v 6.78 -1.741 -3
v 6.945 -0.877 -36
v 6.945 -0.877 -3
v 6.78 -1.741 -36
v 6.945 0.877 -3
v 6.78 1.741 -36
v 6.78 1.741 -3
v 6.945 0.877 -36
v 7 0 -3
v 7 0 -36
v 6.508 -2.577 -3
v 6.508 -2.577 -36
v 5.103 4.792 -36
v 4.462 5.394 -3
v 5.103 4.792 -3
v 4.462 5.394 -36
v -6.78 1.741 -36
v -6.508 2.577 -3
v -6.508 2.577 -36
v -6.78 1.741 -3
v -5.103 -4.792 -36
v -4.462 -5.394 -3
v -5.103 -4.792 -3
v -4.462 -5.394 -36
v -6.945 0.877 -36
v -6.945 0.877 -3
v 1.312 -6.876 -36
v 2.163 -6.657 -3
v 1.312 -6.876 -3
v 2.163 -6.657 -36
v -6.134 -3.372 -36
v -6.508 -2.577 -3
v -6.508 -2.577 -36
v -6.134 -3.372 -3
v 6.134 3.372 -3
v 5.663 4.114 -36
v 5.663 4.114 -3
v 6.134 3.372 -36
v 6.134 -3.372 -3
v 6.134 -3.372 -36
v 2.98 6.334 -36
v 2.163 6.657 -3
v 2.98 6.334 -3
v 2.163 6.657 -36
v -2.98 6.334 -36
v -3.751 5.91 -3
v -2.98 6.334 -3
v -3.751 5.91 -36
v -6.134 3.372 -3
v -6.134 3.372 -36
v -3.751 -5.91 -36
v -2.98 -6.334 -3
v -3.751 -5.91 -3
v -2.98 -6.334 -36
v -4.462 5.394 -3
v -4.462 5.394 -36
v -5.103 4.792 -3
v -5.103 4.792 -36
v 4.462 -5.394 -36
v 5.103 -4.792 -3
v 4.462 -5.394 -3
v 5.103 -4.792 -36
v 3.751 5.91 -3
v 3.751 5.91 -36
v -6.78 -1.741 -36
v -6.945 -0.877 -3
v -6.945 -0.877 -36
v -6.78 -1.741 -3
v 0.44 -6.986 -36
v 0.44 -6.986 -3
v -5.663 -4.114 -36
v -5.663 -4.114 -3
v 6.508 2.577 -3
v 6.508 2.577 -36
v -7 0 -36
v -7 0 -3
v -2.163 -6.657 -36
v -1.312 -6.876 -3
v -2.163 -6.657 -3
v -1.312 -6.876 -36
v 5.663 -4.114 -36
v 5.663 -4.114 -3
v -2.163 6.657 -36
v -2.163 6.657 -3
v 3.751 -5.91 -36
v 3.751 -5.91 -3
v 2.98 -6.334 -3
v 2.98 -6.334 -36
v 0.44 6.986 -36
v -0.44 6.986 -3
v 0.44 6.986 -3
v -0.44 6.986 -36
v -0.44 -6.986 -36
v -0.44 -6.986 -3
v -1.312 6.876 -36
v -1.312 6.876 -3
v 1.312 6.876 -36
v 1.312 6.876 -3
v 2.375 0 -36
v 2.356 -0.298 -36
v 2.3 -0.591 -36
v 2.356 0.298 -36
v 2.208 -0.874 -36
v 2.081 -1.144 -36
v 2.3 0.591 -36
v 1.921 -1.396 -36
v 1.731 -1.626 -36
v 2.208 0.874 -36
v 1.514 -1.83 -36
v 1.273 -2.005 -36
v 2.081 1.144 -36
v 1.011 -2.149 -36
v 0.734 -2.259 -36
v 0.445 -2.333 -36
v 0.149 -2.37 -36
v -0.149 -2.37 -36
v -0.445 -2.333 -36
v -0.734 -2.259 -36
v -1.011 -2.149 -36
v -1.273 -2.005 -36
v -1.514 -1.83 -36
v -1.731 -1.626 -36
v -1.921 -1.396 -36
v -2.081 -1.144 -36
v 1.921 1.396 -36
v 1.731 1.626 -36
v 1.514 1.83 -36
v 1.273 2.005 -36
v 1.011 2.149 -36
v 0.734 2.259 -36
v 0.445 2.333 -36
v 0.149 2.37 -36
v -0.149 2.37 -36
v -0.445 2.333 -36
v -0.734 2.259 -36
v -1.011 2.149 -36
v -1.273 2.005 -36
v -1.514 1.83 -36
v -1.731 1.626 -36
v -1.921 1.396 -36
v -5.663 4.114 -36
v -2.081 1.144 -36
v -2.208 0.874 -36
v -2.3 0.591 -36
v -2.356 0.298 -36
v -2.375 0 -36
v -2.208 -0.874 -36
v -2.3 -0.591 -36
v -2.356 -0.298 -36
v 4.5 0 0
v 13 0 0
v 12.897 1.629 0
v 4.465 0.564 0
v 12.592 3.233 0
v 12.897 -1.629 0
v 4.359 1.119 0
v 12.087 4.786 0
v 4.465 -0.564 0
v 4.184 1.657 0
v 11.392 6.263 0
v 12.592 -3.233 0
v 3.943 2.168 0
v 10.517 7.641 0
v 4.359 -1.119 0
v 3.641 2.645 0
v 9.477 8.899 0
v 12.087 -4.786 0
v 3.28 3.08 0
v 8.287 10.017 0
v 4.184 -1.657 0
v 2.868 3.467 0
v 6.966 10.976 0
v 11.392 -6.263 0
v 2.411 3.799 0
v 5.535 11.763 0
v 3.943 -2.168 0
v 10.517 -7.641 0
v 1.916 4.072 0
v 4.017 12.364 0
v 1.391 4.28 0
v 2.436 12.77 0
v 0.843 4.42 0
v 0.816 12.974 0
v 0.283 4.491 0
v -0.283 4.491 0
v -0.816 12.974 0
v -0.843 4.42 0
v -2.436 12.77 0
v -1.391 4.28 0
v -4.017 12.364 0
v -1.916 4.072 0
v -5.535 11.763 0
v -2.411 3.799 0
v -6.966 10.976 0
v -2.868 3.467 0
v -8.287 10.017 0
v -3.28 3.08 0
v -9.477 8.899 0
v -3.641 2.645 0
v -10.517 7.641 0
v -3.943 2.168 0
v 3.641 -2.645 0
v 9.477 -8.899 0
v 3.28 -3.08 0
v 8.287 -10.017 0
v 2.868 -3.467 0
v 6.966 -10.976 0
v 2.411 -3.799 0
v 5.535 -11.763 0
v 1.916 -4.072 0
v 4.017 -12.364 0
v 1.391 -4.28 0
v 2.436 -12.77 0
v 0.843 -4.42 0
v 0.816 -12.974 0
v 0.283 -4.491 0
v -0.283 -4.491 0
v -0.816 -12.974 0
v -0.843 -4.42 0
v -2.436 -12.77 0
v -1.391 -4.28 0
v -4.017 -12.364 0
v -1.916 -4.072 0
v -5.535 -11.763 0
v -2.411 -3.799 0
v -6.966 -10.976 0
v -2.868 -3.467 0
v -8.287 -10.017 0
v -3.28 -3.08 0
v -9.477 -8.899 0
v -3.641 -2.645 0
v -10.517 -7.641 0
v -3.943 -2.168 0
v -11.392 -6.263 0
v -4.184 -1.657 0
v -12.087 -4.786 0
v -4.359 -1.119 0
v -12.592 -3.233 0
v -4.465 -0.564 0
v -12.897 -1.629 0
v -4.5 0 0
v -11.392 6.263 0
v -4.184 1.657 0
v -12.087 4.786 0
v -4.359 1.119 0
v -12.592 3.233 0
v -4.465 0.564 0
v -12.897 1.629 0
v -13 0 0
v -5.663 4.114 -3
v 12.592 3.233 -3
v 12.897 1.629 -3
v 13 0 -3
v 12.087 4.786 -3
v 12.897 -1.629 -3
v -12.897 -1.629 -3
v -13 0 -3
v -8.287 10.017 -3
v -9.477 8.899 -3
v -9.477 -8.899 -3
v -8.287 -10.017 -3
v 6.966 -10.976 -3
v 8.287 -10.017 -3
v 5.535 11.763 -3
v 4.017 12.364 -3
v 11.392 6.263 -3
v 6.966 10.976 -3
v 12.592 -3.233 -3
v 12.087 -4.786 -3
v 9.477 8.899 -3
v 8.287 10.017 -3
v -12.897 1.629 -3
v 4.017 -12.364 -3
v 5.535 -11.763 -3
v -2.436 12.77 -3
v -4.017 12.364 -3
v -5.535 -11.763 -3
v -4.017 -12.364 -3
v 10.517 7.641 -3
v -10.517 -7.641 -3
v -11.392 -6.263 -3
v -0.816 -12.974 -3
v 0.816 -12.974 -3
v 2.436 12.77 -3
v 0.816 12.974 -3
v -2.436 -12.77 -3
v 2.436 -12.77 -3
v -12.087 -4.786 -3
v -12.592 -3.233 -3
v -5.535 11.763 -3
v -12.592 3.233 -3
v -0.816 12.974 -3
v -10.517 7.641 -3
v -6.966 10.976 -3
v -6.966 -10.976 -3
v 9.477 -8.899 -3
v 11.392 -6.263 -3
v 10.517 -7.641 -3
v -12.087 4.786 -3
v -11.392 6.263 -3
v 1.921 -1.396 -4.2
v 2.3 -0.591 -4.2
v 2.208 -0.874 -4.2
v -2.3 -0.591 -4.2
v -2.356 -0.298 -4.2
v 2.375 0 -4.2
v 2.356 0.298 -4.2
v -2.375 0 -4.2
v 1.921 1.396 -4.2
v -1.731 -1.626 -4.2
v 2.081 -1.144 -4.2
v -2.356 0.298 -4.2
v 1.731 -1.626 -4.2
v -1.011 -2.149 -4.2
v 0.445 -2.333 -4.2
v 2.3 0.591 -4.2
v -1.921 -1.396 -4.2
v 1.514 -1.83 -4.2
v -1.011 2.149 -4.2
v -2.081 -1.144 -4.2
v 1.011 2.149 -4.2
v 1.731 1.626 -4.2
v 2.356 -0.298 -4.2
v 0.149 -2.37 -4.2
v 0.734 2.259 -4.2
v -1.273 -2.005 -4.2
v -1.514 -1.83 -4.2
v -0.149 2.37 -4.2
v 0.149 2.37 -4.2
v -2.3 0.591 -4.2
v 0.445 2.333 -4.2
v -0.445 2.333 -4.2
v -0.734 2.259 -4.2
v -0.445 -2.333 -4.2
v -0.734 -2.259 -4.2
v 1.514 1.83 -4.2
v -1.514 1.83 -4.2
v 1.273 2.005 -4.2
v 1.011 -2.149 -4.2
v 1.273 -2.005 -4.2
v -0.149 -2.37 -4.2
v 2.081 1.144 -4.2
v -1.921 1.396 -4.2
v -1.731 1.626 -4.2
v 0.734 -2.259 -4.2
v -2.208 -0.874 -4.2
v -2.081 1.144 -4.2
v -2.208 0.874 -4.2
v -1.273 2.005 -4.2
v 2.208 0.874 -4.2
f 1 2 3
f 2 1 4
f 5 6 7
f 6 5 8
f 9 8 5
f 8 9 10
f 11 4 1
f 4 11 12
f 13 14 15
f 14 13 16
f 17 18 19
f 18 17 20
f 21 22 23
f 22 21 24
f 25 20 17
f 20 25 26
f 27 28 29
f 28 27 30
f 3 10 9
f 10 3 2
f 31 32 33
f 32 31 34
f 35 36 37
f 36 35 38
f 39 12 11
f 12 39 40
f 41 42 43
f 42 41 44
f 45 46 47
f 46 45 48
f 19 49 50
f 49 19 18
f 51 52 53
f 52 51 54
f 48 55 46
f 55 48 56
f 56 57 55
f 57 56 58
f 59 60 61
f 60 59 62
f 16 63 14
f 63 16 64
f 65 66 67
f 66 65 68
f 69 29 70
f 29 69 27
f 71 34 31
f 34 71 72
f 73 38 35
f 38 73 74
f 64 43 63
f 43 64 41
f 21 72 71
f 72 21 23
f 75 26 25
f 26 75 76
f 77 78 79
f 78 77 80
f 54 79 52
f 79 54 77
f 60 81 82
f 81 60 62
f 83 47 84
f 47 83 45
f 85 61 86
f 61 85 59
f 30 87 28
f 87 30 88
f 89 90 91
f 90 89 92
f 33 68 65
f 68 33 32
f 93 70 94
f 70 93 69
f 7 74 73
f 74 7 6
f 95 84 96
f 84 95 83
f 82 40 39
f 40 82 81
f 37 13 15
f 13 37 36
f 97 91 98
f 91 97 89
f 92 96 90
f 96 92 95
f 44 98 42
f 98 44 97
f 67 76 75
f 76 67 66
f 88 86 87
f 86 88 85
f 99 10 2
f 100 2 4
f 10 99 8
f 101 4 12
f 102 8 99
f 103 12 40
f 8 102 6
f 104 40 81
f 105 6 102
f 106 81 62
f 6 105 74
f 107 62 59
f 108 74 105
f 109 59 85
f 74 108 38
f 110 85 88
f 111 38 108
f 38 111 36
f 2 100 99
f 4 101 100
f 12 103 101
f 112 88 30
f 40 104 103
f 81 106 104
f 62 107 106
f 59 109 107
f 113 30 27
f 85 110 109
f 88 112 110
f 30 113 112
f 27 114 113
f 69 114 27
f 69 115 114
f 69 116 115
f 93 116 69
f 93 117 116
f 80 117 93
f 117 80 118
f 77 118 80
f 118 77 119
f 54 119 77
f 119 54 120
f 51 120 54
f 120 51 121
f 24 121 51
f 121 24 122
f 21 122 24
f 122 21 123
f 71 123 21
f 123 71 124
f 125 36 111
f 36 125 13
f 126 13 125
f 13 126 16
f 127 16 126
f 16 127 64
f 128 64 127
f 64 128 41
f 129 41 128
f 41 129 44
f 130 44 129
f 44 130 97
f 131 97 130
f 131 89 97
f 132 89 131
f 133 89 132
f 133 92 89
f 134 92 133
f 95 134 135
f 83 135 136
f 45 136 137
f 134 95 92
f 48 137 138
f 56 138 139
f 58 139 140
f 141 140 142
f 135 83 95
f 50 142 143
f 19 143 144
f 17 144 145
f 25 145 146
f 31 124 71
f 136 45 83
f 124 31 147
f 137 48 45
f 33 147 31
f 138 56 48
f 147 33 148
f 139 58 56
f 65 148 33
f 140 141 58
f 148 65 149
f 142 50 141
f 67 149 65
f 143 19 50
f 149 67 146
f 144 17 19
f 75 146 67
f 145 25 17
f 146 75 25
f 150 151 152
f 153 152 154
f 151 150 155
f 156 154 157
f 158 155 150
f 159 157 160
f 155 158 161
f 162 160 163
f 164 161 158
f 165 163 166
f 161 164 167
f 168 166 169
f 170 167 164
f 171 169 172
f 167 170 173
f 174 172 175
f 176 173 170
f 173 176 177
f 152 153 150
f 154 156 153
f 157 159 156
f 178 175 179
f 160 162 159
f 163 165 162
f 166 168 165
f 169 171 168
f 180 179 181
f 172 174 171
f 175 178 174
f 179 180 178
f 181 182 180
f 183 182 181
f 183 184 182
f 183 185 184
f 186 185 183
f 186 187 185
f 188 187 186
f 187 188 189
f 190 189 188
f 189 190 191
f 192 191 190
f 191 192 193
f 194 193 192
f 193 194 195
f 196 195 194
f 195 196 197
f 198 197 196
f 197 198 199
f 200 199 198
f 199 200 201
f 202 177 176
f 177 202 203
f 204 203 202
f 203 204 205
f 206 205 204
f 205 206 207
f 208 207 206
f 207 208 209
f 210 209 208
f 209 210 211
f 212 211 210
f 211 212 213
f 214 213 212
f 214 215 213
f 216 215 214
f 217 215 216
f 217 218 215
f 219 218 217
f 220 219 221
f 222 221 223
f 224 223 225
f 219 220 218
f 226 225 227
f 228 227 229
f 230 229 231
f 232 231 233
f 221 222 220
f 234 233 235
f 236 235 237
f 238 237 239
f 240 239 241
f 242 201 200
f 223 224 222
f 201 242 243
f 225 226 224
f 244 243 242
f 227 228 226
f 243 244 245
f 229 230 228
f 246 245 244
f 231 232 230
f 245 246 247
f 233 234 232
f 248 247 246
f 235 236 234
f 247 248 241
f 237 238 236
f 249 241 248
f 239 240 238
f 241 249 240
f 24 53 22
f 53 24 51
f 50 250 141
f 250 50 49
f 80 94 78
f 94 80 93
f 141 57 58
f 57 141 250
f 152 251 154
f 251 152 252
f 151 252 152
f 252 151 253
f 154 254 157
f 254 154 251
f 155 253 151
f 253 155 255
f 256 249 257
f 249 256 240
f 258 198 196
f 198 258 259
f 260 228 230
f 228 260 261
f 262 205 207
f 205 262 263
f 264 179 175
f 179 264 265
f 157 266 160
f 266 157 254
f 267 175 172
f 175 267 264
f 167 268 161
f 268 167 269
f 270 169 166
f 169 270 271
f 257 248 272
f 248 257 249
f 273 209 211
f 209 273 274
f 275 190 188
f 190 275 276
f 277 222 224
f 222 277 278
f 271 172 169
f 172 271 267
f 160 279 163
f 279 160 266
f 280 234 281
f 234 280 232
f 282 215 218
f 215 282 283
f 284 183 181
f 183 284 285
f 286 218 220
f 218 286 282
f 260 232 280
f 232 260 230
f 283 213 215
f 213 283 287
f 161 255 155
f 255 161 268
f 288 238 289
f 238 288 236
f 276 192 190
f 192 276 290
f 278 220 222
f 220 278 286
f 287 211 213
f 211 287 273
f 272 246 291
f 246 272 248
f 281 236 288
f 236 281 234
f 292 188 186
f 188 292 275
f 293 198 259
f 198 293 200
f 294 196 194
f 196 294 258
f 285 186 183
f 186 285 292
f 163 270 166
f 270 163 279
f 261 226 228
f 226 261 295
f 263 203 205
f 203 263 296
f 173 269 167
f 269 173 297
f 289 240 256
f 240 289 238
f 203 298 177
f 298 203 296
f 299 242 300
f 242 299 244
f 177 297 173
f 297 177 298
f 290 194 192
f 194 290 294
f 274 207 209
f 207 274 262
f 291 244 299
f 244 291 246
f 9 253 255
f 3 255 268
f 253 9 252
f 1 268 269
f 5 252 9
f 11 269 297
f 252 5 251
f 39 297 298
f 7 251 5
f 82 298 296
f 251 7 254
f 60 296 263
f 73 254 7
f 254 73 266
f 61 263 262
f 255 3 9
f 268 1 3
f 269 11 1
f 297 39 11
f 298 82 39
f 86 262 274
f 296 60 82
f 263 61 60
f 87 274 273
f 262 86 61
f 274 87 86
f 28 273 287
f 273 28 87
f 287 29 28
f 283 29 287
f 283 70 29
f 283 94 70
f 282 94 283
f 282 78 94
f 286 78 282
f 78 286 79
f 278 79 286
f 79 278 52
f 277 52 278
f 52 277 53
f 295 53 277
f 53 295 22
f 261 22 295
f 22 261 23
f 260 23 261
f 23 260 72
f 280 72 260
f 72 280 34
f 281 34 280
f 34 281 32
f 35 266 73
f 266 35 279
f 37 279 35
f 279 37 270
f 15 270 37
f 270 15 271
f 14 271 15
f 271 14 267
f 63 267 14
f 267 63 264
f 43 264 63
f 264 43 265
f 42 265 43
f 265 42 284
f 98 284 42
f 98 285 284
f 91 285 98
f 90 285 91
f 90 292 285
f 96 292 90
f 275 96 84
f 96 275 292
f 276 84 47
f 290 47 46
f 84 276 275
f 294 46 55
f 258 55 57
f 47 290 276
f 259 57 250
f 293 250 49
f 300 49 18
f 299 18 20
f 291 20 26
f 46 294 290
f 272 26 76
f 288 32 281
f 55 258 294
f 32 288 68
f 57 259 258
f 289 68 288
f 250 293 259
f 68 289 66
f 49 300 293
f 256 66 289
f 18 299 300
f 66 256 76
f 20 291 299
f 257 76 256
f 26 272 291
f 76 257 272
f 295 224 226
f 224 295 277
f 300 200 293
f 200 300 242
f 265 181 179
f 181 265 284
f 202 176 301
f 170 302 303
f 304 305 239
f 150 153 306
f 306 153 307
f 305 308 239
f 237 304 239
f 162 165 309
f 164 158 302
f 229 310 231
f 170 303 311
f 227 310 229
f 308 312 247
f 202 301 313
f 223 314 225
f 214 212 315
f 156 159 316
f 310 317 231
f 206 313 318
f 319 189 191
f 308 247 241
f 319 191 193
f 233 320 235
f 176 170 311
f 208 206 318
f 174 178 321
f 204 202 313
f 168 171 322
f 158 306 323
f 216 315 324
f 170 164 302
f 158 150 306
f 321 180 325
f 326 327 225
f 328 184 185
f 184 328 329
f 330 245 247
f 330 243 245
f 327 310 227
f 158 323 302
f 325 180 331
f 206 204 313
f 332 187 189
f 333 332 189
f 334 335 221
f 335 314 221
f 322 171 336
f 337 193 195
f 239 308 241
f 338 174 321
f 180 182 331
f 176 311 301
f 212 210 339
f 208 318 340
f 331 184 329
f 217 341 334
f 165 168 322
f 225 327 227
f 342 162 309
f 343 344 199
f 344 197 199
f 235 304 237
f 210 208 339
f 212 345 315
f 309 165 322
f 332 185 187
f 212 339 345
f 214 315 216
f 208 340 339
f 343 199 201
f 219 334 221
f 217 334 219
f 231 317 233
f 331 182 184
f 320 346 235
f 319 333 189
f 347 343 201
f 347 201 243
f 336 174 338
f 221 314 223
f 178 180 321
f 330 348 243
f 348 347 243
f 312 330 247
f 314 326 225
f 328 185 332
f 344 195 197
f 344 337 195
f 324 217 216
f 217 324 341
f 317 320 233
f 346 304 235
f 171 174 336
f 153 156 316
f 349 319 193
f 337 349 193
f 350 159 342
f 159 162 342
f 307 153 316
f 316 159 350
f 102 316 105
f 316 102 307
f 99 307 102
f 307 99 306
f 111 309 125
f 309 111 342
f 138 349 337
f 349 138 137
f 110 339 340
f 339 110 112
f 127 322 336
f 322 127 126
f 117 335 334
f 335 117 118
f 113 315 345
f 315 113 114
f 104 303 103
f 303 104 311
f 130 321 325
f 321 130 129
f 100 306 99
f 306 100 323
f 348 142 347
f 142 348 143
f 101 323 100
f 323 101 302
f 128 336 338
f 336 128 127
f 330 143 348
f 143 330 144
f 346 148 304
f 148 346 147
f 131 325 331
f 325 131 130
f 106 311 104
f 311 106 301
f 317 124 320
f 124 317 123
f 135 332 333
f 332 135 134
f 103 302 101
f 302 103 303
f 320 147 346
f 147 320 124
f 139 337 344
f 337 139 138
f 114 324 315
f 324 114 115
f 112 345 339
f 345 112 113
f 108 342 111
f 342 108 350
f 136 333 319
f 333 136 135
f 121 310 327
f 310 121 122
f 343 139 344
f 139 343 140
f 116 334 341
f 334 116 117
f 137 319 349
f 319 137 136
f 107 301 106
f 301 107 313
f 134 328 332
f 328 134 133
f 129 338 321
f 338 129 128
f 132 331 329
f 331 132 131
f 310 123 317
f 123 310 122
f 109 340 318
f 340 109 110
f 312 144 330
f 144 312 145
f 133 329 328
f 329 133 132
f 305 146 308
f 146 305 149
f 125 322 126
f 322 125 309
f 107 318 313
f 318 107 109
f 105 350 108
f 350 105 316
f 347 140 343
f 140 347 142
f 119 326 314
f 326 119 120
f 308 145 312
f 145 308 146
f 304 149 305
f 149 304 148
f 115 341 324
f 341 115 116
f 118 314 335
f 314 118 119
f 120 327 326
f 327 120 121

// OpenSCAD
$fn = 50;


difference() {
	union() {
		translate(v = [0, 0, -36.0000000000]) {
			cylinder(h = 36, r = 7.0000000000);
		}
		translate(v = [0, 0, -3.0000000000]) {
			cylinder(h = 3, r = 13.0000000000);
		}
	}
	union() {
		translate(v = [0, 0, 0]) {
			rotate(a = [0, 0, 0]) {
				difference() {
					union() {
						#translate(v = [0, 0, -36.0000000000]) {
							cylinder(h = 36, r = 2.2500000000);
						}
						#translate(v = [0, 0, -4.2000000000]) {
							cylinder(h = 4.2000000000, r1 = 2.3750000000, r2 = 4.5000000000);
						}
						#translate(v = [0, 0, -36.0000000000]) {
							cylinder(h = 36, r = 2.3750000000);
						}
						#translate(v = [0, 0, -36.0000000000]) {
							cylinder(h = 36, r = 2.2500000000);
						}
					}
					union();
				}
			}
		}
	}
}
